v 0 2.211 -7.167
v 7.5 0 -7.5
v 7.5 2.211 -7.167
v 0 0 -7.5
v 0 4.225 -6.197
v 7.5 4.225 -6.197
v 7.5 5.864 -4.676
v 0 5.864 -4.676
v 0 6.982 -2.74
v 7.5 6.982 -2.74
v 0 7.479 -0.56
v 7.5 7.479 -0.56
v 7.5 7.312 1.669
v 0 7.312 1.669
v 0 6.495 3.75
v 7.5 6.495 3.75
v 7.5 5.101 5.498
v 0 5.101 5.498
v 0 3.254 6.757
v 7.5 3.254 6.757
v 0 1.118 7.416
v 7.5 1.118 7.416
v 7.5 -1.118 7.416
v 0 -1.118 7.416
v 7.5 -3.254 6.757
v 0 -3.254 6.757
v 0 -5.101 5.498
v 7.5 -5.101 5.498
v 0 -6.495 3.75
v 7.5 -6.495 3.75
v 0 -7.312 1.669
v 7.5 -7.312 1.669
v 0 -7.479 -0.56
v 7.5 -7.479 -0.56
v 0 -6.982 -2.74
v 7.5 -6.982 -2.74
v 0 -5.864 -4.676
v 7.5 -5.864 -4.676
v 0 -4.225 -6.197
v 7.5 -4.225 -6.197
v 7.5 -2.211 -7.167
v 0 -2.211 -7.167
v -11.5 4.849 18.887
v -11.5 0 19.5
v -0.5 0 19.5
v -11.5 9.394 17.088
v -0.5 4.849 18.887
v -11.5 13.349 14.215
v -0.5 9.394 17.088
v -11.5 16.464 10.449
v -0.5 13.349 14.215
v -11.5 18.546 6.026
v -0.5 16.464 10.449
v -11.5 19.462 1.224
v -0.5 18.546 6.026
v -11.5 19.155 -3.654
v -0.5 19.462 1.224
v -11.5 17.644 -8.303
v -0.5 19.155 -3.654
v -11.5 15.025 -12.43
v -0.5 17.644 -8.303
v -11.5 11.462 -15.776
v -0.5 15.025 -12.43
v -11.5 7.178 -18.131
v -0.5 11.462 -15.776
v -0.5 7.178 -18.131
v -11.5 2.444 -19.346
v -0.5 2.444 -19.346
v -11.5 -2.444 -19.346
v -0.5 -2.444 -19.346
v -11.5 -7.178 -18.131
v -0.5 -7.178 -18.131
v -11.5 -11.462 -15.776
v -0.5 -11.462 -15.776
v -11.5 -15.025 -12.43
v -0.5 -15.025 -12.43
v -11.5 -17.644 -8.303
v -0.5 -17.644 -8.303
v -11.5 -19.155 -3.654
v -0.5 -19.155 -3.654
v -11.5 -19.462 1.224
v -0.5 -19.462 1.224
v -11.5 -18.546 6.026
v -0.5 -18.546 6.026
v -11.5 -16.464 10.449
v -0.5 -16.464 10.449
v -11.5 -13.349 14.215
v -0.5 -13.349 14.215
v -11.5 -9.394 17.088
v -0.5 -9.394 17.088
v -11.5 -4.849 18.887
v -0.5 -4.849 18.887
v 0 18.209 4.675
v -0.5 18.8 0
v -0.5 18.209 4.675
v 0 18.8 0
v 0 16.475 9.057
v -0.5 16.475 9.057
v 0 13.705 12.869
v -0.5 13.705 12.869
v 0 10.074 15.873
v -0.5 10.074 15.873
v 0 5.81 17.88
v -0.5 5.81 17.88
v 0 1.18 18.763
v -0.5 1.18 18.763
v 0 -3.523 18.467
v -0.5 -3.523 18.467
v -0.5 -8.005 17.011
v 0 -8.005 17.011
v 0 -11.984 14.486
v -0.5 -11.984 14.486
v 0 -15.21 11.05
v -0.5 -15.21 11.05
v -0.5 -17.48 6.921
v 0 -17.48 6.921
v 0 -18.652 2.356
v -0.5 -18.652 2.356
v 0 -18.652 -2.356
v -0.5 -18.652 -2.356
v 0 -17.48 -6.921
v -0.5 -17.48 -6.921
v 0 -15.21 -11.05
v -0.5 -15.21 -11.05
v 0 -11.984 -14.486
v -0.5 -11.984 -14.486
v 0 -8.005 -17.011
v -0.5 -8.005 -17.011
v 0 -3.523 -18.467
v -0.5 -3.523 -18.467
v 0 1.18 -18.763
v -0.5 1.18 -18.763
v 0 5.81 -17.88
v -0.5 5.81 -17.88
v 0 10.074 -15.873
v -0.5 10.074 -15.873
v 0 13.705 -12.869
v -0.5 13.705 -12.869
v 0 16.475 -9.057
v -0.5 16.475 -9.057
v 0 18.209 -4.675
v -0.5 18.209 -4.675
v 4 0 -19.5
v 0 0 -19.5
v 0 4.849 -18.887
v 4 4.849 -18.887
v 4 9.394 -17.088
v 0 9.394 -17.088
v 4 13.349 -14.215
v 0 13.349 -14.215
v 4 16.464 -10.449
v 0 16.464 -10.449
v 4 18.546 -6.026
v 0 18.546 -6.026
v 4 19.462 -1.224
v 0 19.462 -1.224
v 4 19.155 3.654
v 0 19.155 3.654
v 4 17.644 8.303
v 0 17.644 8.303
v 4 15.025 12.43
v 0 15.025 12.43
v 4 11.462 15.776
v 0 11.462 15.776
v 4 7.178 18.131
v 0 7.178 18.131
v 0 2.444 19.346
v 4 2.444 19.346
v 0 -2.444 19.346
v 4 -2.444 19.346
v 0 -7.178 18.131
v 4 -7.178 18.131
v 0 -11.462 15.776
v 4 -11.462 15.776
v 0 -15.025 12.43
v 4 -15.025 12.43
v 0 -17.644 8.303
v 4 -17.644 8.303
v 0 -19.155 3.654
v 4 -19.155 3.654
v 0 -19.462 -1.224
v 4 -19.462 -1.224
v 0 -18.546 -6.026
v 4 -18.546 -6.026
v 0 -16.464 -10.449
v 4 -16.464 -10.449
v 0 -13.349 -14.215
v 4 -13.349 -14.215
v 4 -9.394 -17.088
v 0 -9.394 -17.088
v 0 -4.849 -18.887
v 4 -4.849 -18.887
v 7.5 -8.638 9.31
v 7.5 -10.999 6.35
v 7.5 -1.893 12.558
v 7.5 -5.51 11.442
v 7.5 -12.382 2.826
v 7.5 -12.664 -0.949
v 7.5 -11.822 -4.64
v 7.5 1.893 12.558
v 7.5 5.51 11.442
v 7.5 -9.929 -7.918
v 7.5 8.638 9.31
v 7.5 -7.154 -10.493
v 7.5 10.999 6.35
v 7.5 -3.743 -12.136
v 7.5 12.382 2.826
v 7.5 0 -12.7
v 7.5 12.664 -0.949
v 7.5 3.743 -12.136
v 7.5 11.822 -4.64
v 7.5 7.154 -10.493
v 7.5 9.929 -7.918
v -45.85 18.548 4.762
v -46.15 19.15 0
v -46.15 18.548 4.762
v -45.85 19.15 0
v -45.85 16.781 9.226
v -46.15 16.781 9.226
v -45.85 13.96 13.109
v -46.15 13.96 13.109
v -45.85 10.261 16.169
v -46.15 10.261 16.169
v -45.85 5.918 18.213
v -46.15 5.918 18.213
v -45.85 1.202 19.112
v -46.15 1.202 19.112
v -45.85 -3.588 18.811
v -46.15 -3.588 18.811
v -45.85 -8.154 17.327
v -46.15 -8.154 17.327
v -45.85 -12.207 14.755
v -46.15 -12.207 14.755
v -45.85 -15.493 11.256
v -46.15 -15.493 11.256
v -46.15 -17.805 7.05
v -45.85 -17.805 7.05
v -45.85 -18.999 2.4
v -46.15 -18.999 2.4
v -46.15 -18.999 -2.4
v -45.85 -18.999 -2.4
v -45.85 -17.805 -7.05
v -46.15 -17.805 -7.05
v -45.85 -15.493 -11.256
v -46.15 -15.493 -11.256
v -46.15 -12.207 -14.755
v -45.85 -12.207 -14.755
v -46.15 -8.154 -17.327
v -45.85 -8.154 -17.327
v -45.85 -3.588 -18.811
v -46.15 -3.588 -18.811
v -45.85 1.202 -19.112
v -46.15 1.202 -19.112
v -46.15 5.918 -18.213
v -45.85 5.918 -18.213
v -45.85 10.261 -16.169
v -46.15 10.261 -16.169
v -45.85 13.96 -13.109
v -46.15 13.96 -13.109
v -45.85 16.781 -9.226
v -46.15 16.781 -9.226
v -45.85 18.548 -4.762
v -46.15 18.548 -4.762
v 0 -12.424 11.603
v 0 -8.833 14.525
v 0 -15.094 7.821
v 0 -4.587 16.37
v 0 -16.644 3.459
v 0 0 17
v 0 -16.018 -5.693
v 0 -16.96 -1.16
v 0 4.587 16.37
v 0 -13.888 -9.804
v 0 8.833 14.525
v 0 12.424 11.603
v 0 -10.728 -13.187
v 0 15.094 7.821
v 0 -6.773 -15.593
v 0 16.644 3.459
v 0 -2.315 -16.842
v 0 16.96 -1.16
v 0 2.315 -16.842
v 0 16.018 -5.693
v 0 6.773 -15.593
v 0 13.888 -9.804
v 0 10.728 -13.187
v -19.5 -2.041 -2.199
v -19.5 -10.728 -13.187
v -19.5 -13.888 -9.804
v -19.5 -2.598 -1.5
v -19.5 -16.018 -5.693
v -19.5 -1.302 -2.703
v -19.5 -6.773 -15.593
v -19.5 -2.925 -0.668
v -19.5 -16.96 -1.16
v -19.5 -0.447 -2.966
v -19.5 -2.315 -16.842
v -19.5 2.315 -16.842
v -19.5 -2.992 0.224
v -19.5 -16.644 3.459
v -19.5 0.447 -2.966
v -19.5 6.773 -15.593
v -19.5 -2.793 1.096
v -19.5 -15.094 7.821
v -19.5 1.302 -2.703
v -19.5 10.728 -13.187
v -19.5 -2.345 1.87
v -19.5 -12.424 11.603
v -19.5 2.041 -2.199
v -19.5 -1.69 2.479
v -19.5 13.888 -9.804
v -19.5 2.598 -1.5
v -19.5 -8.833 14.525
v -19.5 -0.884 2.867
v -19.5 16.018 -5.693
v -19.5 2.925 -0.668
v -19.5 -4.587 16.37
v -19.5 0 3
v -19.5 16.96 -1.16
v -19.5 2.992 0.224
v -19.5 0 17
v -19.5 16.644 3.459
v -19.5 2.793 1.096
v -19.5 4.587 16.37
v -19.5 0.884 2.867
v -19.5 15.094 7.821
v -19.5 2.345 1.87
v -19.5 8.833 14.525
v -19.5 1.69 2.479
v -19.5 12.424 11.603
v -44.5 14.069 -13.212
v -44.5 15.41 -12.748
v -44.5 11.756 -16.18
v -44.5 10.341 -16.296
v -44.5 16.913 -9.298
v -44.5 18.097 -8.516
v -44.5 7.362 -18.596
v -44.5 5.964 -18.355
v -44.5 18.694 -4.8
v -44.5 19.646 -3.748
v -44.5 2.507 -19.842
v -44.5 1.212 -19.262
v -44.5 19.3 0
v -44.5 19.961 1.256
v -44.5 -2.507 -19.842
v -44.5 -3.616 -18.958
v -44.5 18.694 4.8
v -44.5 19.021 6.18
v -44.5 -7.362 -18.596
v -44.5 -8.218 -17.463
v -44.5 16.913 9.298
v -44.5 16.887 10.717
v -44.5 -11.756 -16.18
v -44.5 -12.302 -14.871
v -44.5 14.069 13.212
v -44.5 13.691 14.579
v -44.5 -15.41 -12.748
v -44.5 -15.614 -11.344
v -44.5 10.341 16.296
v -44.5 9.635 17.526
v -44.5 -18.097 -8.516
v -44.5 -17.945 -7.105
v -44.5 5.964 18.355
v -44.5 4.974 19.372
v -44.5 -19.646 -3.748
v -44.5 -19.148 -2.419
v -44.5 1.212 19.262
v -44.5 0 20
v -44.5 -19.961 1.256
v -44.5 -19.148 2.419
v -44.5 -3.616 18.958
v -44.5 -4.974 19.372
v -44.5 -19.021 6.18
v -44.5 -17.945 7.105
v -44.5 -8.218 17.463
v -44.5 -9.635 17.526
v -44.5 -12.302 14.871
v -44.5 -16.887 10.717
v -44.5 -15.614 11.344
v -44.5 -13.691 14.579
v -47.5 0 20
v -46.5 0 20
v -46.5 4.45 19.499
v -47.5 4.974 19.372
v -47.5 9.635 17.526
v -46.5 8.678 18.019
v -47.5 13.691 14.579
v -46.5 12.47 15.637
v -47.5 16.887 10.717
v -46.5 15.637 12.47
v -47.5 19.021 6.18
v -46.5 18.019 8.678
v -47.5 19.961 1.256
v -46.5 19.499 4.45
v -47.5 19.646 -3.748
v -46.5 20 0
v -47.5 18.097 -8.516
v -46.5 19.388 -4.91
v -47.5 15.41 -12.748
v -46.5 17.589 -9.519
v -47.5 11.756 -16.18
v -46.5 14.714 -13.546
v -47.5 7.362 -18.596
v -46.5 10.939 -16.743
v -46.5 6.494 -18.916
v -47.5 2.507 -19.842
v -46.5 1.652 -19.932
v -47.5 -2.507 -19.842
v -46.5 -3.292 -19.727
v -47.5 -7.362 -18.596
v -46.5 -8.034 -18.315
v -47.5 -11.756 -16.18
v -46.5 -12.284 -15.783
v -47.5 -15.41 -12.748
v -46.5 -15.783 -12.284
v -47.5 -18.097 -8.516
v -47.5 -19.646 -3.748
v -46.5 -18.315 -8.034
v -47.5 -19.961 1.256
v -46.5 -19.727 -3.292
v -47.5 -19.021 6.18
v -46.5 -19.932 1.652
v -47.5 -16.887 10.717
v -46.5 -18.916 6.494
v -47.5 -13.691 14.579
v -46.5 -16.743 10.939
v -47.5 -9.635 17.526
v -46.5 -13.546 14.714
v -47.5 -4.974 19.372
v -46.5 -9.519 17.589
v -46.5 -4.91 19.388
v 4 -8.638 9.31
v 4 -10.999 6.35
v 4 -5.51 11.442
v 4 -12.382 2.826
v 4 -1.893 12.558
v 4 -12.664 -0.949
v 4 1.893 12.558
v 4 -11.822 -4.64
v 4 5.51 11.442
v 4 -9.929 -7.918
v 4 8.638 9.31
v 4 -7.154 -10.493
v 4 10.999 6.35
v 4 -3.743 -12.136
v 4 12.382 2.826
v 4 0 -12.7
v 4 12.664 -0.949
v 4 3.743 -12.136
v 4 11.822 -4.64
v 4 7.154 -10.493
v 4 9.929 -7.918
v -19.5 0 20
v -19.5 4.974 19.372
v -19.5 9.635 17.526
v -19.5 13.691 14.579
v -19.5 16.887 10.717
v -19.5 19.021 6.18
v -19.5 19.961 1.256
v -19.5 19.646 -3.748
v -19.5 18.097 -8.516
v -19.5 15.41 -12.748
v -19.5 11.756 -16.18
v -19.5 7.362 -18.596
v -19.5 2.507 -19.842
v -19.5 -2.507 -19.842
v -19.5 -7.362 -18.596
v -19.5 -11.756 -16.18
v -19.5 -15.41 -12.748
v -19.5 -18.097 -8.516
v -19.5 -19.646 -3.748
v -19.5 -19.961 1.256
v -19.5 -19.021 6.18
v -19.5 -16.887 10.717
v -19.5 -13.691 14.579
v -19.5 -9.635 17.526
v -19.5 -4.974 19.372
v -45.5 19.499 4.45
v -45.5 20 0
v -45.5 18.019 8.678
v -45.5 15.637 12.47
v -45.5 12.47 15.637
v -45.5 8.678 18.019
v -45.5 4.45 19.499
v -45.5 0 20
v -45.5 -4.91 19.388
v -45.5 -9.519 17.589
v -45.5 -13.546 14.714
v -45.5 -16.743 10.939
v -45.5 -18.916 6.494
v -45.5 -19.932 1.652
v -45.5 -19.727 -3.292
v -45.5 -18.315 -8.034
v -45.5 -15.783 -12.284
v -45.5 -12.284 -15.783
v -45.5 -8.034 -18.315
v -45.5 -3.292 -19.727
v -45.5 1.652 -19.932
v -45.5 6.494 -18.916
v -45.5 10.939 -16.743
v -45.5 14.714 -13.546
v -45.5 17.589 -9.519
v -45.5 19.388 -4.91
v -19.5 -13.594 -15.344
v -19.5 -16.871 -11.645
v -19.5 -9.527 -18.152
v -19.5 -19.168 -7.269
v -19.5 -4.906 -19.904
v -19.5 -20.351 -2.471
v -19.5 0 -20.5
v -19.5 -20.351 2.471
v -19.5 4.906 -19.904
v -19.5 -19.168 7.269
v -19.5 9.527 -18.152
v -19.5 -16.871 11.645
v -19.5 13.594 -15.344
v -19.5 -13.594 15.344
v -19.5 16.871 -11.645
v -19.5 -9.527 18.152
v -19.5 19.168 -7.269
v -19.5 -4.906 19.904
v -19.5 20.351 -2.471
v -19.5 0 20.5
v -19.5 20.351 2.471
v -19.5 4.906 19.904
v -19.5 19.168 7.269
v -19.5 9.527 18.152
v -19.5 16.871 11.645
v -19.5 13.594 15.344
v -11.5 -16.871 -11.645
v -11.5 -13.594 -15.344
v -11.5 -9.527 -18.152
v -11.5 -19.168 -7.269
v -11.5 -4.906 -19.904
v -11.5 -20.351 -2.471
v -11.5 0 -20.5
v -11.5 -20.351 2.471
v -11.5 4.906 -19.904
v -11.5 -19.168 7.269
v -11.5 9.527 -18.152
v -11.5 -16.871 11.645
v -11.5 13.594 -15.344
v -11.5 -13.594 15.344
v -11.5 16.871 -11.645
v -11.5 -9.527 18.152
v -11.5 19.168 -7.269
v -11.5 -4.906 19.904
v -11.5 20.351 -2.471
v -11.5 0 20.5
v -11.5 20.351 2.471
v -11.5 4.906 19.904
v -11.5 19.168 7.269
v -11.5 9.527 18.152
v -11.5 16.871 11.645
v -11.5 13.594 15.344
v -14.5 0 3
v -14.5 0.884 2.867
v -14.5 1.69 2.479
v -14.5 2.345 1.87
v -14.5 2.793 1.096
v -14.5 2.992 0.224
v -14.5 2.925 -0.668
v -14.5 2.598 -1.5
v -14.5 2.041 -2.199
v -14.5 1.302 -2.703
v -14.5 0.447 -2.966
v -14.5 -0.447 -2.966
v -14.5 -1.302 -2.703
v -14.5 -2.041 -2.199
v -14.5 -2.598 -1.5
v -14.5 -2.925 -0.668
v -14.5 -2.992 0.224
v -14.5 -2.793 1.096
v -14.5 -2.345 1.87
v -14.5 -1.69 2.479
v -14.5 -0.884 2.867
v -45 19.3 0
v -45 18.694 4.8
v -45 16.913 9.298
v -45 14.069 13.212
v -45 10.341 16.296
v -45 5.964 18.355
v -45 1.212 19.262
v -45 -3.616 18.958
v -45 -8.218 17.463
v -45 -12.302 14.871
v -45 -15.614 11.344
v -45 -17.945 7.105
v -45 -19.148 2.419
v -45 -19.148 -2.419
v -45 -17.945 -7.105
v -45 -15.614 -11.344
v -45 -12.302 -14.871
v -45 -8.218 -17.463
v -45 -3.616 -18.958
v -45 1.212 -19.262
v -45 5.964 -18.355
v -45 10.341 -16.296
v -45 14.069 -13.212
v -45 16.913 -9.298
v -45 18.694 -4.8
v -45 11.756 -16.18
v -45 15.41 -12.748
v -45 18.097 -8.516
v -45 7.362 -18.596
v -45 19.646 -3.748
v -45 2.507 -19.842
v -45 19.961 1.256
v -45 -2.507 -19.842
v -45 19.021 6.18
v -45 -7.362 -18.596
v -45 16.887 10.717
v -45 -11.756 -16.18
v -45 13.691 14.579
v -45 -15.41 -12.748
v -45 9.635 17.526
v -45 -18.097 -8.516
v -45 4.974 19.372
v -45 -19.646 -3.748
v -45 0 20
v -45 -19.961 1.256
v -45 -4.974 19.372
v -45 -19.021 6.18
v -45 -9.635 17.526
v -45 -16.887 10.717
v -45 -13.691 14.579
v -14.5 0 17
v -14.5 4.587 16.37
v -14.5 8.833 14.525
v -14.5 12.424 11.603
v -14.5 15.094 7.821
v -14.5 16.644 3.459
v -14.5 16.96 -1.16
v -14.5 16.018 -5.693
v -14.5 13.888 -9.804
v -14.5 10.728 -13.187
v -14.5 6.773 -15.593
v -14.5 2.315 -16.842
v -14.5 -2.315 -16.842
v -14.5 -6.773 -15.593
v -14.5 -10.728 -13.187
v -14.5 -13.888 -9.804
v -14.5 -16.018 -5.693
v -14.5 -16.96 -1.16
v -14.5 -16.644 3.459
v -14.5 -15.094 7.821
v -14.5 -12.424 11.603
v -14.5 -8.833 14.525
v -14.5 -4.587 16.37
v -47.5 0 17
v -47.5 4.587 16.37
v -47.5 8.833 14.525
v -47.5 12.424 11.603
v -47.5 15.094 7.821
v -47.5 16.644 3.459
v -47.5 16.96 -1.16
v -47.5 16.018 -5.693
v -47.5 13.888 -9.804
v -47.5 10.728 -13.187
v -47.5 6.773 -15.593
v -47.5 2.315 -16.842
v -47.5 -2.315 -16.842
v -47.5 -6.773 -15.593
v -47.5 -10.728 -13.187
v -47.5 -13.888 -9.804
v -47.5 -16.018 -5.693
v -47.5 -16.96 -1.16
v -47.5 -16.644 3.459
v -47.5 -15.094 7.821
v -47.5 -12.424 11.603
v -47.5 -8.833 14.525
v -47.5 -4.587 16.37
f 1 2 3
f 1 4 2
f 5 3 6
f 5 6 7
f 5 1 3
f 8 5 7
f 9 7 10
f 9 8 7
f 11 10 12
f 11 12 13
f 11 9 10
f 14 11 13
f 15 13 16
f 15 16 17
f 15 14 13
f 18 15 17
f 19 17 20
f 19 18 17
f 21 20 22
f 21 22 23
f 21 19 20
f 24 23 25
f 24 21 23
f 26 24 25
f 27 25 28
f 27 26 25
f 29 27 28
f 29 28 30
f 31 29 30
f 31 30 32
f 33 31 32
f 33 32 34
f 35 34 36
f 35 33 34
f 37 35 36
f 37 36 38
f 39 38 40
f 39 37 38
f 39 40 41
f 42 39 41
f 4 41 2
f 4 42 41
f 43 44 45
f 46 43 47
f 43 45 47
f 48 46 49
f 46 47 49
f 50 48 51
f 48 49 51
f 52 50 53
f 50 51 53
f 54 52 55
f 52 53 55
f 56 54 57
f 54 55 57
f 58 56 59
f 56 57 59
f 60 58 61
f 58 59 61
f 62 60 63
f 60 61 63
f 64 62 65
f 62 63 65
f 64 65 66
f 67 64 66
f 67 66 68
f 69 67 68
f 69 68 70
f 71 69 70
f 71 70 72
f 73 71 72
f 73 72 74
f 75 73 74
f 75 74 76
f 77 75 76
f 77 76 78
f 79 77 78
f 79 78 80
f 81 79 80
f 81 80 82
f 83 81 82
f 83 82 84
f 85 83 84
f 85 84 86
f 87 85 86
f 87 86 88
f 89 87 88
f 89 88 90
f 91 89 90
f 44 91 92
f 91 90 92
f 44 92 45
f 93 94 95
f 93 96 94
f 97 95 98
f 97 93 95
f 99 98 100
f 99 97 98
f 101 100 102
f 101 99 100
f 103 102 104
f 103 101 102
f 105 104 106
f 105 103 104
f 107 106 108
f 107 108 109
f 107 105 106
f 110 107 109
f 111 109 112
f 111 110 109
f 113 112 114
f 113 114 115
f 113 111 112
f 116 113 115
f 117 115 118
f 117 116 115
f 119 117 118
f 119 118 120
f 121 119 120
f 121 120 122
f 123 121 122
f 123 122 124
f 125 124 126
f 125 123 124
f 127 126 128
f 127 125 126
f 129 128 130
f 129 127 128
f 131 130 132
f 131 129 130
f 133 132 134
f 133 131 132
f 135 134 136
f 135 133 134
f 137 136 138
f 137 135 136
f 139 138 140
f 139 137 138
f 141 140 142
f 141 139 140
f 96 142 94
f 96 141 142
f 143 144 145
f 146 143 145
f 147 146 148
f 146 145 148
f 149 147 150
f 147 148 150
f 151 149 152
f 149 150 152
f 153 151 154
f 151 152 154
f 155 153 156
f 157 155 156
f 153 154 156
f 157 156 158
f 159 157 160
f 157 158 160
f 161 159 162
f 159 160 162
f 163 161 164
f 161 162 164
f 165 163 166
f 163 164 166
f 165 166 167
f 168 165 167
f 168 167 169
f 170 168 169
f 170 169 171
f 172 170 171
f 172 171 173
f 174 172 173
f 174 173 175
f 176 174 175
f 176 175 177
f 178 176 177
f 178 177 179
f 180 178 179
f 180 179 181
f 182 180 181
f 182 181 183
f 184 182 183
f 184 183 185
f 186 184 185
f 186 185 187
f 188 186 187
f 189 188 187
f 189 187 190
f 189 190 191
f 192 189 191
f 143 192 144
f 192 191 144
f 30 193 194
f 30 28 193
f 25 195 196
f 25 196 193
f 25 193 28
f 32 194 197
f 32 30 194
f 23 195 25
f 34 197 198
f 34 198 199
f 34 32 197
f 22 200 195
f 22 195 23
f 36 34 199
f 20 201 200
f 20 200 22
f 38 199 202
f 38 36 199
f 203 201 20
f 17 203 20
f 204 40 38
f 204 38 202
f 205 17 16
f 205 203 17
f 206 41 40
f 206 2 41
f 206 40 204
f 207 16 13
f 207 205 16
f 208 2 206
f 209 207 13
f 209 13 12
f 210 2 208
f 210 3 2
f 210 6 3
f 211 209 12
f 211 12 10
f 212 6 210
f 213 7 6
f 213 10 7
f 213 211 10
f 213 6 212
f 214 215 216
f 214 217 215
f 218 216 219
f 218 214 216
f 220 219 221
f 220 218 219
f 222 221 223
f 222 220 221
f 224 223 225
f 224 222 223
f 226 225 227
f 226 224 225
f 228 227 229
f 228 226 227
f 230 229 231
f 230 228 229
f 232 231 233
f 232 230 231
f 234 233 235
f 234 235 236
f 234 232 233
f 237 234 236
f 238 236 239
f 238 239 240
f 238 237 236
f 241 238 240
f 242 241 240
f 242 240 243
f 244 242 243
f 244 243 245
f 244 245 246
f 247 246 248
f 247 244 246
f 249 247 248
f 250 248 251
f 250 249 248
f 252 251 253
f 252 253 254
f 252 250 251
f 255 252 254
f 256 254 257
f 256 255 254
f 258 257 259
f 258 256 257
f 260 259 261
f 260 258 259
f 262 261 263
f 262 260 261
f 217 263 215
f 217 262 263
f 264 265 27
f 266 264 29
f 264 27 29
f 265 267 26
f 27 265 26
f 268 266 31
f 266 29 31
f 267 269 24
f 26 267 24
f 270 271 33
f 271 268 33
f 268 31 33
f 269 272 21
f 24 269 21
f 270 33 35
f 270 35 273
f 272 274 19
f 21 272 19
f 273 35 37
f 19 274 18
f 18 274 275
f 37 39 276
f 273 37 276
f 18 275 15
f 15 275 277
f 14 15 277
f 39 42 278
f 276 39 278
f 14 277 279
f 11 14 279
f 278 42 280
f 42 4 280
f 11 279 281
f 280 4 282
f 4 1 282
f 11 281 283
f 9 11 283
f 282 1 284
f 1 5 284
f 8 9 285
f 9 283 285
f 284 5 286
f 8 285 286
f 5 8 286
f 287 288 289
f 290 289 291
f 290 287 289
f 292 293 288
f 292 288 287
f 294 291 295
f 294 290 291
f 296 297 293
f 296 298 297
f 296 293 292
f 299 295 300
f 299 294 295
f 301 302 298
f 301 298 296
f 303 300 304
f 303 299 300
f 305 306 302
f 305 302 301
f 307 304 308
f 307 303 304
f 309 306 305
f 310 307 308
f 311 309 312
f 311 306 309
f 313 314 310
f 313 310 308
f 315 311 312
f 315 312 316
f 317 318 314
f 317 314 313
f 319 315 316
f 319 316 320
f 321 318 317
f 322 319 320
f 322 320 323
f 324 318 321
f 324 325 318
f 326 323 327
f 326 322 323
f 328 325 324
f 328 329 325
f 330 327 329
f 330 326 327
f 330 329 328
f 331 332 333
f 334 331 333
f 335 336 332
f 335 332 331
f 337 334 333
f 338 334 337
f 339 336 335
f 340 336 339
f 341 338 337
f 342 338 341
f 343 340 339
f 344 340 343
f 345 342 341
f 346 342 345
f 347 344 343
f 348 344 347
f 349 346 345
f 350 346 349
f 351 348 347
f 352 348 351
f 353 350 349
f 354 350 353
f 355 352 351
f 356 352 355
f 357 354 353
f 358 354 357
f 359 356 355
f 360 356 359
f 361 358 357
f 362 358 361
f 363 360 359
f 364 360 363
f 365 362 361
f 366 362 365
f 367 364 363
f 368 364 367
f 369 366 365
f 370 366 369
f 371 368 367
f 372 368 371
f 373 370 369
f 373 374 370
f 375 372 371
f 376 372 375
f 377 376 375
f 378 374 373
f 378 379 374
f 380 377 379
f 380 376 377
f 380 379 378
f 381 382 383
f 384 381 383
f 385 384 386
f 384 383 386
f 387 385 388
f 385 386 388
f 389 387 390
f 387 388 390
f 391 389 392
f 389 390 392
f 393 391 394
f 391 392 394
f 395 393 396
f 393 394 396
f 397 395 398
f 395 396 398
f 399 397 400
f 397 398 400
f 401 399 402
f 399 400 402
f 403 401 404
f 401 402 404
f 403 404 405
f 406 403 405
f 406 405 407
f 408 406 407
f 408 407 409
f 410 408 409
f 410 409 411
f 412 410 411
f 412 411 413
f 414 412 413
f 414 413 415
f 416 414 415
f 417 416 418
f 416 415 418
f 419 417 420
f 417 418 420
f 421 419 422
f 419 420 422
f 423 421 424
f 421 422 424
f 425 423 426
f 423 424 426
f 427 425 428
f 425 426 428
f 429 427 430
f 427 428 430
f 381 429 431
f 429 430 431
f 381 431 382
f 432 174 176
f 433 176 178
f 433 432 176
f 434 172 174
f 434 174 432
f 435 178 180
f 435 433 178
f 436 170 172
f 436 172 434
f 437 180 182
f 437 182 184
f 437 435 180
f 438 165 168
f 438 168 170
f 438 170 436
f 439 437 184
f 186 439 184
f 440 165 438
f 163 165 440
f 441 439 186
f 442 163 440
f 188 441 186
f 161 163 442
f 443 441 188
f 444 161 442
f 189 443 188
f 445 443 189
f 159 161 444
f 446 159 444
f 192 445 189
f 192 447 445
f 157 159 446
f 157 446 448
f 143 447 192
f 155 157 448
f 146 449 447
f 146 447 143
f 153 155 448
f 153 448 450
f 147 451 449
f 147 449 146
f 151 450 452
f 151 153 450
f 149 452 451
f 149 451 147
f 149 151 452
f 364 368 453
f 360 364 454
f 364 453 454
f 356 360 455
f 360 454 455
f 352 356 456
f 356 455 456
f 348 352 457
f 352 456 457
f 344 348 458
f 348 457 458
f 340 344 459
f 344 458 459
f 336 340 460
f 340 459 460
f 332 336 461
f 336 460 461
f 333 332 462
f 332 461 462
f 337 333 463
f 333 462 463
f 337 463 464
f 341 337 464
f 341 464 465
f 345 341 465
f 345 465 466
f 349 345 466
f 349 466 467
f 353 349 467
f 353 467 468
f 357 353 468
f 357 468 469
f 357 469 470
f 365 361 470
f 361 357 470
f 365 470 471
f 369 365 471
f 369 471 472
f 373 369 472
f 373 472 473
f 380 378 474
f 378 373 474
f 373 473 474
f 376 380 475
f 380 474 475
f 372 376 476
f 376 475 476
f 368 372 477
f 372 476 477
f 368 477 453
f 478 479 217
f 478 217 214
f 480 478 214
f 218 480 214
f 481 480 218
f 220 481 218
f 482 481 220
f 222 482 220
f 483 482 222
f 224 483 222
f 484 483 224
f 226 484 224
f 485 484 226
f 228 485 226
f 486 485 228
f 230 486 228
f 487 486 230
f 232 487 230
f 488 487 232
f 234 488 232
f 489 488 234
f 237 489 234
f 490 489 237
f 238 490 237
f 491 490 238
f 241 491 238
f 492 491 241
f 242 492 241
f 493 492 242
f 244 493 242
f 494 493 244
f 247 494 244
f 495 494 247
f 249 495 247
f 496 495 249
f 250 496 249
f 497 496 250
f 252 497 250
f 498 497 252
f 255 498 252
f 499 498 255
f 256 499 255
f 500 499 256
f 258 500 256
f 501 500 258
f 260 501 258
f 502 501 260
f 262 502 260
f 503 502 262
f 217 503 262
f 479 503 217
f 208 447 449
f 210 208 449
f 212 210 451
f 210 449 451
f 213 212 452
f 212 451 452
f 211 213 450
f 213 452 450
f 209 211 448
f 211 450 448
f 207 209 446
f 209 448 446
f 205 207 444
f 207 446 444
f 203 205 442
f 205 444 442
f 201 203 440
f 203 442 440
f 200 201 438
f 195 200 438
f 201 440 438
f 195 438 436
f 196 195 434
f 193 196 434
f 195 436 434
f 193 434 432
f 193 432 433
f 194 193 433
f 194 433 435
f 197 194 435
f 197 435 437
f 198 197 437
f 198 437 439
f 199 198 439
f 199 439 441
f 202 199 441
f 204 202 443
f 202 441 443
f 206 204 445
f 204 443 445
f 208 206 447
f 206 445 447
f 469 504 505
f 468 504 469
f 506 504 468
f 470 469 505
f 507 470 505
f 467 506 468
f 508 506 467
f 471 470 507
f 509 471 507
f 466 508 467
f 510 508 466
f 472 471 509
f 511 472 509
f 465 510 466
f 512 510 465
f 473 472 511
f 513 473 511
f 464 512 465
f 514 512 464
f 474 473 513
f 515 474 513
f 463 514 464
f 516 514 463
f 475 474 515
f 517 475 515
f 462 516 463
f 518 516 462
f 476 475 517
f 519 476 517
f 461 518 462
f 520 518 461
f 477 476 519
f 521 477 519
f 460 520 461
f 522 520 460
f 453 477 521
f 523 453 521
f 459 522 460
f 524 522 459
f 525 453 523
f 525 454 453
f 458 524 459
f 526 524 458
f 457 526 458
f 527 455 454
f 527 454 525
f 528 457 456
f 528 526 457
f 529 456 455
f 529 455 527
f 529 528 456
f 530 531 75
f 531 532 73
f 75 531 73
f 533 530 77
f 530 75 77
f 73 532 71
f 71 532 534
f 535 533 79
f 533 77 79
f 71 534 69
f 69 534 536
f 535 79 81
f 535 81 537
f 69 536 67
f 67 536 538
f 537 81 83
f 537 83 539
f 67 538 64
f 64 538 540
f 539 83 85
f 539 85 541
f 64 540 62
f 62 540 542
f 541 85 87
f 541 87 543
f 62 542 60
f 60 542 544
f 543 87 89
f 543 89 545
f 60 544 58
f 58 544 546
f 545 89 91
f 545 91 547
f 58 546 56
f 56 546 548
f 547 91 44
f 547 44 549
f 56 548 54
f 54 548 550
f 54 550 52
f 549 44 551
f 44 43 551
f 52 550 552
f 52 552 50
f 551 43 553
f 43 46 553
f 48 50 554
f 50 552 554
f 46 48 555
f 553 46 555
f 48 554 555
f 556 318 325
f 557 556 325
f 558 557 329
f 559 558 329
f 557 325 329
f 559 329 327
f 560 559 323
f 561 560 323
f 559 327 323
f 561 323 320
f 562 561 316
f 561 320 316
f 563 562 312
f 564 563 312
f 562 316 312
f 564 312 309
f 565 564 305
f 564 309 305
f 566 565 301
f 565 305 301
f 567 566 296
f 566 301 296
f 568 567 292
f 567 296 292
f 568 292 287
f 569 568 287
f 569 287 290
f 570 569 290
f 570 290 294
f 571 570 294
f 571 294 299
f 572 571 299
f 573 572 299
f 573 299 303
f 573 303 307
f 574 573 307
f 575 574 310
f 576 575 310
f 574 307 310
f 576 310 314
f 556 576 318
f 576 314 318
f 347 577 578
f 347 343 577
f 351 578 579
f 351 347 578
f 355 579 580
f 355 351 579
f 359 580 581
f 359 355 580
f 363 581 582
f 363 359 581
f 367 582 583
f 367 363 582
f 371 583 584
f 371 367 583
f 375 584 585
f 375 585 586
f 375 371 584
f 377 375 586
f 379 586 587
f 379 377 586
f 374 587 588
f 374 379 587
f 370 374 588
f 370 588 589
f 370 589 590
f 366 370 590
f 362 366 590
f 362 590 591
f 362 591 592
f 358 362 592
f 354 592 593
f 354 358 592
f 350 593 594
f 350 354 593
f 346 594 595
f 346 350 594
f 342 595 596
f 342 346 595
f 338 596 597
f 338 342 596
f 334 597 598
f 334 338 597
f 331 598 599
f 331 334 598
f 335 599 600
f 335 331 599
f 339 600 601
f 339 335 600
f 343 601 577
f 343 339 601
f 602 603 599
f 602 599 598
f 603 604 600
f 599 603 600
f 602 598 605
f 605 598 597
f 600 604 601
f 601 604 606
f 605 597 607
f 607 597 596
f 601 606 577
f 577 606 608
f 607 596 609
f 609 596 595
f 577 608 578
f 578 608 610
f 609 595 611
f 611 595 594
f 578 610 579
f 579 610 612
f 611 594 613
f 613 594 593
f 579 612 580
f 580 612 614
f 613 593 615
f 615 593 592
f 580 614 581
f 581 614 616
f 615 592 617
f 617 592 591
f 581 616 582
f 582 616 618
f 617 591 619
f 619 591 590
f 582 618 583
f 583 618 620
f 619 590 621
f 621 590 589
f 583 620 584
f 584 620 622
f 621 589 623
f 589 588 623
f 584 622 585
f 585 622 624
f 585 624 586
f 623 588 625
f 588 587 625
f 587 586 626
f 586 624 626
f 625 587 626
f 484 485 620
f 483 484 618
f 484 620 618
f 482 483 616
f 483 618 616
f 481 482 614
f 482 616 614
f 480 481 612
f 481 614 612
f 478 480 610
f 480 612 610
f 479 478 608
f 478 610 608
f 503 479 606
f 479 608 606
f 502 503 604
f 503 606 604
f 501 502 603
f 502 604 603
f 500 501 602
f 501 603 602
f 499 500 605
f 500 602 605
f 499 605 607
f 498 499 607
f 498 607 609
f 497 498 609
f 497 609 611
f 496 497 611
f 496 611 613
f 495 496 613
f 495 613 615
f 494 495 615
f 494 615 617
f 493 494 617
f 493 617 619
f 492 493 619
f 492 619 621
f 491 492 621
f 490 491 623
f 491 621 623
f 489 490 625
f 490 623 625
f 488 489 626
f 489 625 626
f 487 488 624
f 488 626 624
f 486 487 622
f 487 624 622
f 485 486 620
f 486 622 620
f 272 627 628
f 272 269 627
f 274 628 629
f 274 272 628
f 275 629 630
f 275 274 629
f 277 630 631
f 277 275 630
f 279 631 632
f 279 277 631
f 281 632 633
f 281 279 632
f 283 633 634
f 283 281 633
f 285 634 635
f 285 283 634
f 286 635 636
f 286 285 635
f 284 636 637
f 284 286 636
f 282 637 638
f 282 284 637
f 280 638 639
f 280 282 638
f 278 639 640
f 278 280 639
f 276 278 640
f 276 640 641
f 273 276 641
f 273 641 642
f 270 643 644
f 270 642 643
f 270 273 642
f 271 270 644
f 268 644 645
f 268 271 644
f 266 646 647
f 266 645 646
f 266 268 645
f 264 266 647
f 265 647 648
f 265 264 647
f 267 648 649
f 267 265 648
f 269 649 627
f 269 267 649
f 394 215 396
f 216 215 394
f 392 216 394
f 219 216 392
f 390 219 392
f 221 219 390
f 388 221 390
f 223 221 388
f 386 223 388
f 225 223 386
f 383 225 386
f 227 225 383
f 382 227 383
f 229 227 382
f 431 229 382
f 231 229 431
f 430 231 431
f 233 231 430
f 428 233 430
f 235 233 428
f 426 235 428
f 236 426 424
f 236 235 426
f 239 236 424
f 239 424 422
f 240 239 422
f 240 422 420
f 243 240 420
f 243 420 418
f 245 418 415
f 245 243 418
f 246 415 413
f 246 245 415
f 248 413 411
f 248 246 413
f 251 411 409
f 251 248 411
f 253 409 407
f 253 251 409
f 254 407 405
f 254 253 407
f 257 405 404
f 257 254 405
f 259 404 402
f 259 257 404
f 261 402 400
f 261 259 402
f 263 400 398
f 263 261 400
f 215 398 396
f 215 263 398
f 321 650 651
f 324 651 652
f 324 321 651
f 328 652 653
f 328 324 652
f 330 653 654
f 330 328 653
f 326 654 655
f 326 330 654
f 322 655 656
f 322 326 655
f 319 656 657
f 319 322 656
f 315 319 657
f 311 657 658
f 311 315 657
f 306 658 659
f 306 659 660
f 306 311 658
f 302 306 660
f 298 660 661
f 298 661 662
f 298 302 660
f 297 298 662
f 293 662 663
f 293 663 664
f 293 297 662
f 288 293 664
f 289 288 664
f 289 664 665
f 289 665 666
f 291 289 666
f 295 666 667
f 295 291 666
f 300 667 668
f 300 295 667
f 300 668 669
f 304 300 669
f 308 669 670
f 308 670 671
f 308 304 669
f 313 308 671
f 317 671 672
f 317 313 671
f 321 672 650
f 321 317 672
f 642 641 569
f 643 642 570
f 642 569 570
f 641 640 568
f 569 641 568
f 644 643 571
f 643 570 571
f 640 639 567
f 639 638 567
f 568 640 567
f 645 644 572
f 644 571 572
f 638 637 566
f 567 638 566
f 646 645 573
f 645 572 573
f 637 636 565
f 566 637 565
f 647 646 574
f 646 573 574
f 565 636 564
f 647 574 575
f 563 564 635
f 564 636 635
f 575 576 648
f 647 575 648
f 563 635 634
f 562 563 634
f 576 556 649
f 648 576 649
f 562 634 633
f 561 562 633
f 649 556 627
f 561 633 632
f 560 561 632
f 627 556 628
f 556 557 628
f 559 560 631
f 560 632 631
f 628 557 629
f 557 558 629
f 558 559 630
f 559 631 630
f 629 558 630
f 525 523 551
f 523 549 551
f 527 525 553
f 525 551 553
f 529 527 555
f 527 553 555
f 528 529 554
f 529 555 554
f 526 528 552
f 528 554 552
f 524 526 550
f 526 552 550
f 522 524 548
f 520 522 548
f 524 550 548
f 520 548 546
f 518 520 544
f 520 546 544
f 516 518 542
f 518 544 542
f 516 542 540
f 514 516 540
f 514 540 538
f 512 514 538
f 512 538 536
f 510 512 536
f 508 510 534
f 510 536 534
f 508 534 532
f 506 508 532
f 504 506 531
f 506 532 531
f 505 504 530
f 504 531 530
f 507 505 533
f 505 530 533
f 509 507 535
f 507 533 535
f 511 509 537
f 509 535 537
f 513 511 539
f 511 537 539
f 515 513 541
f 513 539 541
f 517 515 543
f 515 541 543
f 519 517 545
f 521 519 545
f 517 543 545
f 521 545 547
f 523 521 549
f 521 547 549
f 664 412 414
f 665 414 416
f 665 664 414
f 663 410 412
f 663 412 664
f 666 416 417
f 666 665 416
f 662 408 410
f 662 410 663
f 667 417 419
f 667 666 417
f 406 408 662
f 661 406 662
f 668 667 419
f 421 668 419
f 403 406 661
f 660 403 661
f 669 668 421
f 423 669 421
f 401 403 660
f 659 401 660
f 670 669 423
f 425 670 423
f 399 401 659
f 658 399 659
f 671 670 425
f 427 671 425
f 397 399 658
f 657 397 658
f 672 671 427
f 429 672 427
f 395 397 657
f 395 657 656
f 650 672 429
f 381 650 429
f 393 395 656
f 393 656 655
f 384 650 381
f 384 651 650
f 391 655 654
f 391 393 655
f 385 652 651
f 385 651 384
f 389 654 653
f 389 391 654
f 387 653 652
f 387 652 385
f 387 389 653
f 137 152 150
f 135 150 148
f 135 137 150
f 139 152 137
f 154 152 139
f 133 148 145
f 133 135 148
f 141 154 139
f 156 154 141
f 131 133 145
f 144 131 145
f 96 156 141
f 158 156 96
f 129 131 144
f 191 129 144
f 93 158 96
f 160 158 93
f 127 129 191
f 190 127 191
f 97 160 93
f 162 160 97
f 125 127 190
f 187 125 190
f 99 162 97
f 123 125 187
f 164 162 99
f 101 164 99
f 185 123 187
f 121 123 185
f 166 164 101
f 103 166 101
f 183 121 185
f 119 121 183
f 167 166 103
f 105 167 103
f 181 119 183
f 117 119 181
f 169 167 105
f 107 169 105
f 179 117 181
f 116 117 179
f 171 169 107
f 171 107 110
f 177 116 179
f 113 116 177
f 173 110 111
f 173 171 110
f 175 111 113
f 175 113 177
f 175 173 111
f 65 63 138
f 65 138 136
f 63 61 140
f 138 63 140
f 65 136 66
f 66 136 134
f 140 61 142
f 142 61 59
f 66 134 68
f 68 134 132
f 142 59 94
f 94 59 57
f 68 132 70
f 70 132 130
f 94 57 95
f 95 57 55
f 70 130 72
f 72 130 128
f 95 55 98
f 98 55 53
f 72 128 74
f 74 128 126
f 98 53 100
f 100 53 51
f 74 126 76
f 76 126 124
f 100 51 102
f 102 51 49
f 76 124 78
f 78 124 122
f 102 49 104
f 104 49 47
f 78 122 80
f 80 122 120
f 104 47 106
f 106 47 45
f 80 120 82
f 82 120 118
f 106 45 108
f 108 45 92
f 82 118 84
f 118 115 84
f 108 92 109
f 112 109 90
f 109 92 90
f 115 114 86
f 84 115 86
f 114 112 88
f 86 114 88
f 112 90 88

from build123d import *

# Parameters (mm, degrees)
SKETCH1_R           = 19.5
SKETCH1_R_2         = 7.5
BOSS_EXTRUDE1_DEPTH = 4
BOSS_EXTRUDE2_START = 11.5
SKETCH2_R           = 19.5
SKETCH2_R_2         = 17
BOSS_EXTRUDE2_DEPTH = 11.5
SKETCH3_W           = 0.5
SKETCH3_H           = 0.7
BOSS_EXTRUDE3_START = 8
SKETCH4_R           = 20.5
SKETCH4_R_2         = 17
BOSS_EXTRUDE3_DEPTH = 8
BOSS_EXTRUDE4_START = 28
SKETCH5_R           = 20
SKETCH5_R_2         = 17
BOSS_EXTRUDE4_DEPTH = 28
SKETCH6_W           = 0.5
SKETCH6_H           = 0.7
SKETCH7_R           = 12.7
SKETCH7_R_2         = 7.5
BOSS_EXTRUDE5_DEPTH = 3.5
SKETCH8_R           = 20.5
SKETCH8_R_2         = 3
BOSS_EXTRUDE6_DEPTH = 5


with BuildPart() as part:
    # Sketch1 → Boss-Extrude1 (new body)
    with BuildSketch(Plane(origin=(0, 0, 0), x_dir=(0, 0, -1), z_dir=(1, 0, 0))):
        Circle(SKETCH1_R)
        Circle(SKETCH1_R_2, mode=Mode.SUBTRACT)
    extrude(amount=BOSS_EXTRUDE1_DEPTH)

    # Sketch2 → Boss-Extrude2 (add)
    with BuildSketch(Plane.ZY.offset(BOSS_EXTRUDE2_START)):
        Circle(SKETCH2_R)
        Circle(SKETCH2_R_2, mode=Mode.SUBTRACT)
    extrude(amount=-BOSS_EXTRUDE2_DEPTH)

    # Sketch3 → Cut-Revolve1 (revolve, cut)
    with BuildSketch(Plane.XY):
        with Locations((-0.25, 19.15)):
            Rectangle(SKETCH3_W, SKETCH3_H)
    revolve(axis=Axis((-11.5, 0, 0), (1, 0, 0)), mode=Mode.SUBTRACT)

    # Sketch4 → Boss-Extrude3 (add)
    with BuildSketch(Plane.ZY.offset(11.5).offset(BOSS_EXTRUDE3_START)):
        Circle(SKETCH4_R)
        Circle(SKETCH4_R_2, mode=Mode.SUBTRACT)
    extrude(amount=-BOSS_EXTRUDE3_DEPTH)

    # Sketch5 → Boss-Extrude4 (add)
    with BuildSketch(Plane.ZY.offset(19.5).offset(BOSS_EXTRUDE4_START)):
        Circle(SKETCH5_R)
        Circle(SKETCH5_R_2, mode=Mode.SUBTRACT)
    extrude(amount=-BOSS_EXTRUDE4_DEPTH)

    # Sketch6 → Cut-Revolve2 (revolve, cut)
    with BuildSketch(Plane.XY):
        with Locations((-44.75, 19.65)):
            Rectangle(SKETCH6_W, SKETCH6_H)
        Polygon((-45.5, 20), (-46.5, 20), (-46.15, 19.15), (-45.85, 19.15), align=None)
    revolve(axis=Axis((-11.5, 0, 0), (1, 0, 0)), mode=Mode.SUBTRACT)

    # Sketch7 → Boss-Extrude5 (add)
    with BuildSketch(Plane(origin=(4, 0, 0), x_dir=(0, 0, -1), z_dir=(1, 0, 0))):
        Circle(SKETCH7_R)
        Circle(SKETCH7_R_2, mode=Mode.SUBTRACT)
    extrude(amount=BOSS_EXTRUDE5_DEPTH)

    # Sketch8 → Boss-Extrude6 (add)
    with BuildSketch(Plane.ZY.offset(19.5)):
        Circle(SKETCH8_R)
        Circle(SKETCH8_R_2, mode=Mode.SUBTRACT)
    extrude(amount=-BOSS_EXTRUDE6_DEPTH)


solid = part.part
